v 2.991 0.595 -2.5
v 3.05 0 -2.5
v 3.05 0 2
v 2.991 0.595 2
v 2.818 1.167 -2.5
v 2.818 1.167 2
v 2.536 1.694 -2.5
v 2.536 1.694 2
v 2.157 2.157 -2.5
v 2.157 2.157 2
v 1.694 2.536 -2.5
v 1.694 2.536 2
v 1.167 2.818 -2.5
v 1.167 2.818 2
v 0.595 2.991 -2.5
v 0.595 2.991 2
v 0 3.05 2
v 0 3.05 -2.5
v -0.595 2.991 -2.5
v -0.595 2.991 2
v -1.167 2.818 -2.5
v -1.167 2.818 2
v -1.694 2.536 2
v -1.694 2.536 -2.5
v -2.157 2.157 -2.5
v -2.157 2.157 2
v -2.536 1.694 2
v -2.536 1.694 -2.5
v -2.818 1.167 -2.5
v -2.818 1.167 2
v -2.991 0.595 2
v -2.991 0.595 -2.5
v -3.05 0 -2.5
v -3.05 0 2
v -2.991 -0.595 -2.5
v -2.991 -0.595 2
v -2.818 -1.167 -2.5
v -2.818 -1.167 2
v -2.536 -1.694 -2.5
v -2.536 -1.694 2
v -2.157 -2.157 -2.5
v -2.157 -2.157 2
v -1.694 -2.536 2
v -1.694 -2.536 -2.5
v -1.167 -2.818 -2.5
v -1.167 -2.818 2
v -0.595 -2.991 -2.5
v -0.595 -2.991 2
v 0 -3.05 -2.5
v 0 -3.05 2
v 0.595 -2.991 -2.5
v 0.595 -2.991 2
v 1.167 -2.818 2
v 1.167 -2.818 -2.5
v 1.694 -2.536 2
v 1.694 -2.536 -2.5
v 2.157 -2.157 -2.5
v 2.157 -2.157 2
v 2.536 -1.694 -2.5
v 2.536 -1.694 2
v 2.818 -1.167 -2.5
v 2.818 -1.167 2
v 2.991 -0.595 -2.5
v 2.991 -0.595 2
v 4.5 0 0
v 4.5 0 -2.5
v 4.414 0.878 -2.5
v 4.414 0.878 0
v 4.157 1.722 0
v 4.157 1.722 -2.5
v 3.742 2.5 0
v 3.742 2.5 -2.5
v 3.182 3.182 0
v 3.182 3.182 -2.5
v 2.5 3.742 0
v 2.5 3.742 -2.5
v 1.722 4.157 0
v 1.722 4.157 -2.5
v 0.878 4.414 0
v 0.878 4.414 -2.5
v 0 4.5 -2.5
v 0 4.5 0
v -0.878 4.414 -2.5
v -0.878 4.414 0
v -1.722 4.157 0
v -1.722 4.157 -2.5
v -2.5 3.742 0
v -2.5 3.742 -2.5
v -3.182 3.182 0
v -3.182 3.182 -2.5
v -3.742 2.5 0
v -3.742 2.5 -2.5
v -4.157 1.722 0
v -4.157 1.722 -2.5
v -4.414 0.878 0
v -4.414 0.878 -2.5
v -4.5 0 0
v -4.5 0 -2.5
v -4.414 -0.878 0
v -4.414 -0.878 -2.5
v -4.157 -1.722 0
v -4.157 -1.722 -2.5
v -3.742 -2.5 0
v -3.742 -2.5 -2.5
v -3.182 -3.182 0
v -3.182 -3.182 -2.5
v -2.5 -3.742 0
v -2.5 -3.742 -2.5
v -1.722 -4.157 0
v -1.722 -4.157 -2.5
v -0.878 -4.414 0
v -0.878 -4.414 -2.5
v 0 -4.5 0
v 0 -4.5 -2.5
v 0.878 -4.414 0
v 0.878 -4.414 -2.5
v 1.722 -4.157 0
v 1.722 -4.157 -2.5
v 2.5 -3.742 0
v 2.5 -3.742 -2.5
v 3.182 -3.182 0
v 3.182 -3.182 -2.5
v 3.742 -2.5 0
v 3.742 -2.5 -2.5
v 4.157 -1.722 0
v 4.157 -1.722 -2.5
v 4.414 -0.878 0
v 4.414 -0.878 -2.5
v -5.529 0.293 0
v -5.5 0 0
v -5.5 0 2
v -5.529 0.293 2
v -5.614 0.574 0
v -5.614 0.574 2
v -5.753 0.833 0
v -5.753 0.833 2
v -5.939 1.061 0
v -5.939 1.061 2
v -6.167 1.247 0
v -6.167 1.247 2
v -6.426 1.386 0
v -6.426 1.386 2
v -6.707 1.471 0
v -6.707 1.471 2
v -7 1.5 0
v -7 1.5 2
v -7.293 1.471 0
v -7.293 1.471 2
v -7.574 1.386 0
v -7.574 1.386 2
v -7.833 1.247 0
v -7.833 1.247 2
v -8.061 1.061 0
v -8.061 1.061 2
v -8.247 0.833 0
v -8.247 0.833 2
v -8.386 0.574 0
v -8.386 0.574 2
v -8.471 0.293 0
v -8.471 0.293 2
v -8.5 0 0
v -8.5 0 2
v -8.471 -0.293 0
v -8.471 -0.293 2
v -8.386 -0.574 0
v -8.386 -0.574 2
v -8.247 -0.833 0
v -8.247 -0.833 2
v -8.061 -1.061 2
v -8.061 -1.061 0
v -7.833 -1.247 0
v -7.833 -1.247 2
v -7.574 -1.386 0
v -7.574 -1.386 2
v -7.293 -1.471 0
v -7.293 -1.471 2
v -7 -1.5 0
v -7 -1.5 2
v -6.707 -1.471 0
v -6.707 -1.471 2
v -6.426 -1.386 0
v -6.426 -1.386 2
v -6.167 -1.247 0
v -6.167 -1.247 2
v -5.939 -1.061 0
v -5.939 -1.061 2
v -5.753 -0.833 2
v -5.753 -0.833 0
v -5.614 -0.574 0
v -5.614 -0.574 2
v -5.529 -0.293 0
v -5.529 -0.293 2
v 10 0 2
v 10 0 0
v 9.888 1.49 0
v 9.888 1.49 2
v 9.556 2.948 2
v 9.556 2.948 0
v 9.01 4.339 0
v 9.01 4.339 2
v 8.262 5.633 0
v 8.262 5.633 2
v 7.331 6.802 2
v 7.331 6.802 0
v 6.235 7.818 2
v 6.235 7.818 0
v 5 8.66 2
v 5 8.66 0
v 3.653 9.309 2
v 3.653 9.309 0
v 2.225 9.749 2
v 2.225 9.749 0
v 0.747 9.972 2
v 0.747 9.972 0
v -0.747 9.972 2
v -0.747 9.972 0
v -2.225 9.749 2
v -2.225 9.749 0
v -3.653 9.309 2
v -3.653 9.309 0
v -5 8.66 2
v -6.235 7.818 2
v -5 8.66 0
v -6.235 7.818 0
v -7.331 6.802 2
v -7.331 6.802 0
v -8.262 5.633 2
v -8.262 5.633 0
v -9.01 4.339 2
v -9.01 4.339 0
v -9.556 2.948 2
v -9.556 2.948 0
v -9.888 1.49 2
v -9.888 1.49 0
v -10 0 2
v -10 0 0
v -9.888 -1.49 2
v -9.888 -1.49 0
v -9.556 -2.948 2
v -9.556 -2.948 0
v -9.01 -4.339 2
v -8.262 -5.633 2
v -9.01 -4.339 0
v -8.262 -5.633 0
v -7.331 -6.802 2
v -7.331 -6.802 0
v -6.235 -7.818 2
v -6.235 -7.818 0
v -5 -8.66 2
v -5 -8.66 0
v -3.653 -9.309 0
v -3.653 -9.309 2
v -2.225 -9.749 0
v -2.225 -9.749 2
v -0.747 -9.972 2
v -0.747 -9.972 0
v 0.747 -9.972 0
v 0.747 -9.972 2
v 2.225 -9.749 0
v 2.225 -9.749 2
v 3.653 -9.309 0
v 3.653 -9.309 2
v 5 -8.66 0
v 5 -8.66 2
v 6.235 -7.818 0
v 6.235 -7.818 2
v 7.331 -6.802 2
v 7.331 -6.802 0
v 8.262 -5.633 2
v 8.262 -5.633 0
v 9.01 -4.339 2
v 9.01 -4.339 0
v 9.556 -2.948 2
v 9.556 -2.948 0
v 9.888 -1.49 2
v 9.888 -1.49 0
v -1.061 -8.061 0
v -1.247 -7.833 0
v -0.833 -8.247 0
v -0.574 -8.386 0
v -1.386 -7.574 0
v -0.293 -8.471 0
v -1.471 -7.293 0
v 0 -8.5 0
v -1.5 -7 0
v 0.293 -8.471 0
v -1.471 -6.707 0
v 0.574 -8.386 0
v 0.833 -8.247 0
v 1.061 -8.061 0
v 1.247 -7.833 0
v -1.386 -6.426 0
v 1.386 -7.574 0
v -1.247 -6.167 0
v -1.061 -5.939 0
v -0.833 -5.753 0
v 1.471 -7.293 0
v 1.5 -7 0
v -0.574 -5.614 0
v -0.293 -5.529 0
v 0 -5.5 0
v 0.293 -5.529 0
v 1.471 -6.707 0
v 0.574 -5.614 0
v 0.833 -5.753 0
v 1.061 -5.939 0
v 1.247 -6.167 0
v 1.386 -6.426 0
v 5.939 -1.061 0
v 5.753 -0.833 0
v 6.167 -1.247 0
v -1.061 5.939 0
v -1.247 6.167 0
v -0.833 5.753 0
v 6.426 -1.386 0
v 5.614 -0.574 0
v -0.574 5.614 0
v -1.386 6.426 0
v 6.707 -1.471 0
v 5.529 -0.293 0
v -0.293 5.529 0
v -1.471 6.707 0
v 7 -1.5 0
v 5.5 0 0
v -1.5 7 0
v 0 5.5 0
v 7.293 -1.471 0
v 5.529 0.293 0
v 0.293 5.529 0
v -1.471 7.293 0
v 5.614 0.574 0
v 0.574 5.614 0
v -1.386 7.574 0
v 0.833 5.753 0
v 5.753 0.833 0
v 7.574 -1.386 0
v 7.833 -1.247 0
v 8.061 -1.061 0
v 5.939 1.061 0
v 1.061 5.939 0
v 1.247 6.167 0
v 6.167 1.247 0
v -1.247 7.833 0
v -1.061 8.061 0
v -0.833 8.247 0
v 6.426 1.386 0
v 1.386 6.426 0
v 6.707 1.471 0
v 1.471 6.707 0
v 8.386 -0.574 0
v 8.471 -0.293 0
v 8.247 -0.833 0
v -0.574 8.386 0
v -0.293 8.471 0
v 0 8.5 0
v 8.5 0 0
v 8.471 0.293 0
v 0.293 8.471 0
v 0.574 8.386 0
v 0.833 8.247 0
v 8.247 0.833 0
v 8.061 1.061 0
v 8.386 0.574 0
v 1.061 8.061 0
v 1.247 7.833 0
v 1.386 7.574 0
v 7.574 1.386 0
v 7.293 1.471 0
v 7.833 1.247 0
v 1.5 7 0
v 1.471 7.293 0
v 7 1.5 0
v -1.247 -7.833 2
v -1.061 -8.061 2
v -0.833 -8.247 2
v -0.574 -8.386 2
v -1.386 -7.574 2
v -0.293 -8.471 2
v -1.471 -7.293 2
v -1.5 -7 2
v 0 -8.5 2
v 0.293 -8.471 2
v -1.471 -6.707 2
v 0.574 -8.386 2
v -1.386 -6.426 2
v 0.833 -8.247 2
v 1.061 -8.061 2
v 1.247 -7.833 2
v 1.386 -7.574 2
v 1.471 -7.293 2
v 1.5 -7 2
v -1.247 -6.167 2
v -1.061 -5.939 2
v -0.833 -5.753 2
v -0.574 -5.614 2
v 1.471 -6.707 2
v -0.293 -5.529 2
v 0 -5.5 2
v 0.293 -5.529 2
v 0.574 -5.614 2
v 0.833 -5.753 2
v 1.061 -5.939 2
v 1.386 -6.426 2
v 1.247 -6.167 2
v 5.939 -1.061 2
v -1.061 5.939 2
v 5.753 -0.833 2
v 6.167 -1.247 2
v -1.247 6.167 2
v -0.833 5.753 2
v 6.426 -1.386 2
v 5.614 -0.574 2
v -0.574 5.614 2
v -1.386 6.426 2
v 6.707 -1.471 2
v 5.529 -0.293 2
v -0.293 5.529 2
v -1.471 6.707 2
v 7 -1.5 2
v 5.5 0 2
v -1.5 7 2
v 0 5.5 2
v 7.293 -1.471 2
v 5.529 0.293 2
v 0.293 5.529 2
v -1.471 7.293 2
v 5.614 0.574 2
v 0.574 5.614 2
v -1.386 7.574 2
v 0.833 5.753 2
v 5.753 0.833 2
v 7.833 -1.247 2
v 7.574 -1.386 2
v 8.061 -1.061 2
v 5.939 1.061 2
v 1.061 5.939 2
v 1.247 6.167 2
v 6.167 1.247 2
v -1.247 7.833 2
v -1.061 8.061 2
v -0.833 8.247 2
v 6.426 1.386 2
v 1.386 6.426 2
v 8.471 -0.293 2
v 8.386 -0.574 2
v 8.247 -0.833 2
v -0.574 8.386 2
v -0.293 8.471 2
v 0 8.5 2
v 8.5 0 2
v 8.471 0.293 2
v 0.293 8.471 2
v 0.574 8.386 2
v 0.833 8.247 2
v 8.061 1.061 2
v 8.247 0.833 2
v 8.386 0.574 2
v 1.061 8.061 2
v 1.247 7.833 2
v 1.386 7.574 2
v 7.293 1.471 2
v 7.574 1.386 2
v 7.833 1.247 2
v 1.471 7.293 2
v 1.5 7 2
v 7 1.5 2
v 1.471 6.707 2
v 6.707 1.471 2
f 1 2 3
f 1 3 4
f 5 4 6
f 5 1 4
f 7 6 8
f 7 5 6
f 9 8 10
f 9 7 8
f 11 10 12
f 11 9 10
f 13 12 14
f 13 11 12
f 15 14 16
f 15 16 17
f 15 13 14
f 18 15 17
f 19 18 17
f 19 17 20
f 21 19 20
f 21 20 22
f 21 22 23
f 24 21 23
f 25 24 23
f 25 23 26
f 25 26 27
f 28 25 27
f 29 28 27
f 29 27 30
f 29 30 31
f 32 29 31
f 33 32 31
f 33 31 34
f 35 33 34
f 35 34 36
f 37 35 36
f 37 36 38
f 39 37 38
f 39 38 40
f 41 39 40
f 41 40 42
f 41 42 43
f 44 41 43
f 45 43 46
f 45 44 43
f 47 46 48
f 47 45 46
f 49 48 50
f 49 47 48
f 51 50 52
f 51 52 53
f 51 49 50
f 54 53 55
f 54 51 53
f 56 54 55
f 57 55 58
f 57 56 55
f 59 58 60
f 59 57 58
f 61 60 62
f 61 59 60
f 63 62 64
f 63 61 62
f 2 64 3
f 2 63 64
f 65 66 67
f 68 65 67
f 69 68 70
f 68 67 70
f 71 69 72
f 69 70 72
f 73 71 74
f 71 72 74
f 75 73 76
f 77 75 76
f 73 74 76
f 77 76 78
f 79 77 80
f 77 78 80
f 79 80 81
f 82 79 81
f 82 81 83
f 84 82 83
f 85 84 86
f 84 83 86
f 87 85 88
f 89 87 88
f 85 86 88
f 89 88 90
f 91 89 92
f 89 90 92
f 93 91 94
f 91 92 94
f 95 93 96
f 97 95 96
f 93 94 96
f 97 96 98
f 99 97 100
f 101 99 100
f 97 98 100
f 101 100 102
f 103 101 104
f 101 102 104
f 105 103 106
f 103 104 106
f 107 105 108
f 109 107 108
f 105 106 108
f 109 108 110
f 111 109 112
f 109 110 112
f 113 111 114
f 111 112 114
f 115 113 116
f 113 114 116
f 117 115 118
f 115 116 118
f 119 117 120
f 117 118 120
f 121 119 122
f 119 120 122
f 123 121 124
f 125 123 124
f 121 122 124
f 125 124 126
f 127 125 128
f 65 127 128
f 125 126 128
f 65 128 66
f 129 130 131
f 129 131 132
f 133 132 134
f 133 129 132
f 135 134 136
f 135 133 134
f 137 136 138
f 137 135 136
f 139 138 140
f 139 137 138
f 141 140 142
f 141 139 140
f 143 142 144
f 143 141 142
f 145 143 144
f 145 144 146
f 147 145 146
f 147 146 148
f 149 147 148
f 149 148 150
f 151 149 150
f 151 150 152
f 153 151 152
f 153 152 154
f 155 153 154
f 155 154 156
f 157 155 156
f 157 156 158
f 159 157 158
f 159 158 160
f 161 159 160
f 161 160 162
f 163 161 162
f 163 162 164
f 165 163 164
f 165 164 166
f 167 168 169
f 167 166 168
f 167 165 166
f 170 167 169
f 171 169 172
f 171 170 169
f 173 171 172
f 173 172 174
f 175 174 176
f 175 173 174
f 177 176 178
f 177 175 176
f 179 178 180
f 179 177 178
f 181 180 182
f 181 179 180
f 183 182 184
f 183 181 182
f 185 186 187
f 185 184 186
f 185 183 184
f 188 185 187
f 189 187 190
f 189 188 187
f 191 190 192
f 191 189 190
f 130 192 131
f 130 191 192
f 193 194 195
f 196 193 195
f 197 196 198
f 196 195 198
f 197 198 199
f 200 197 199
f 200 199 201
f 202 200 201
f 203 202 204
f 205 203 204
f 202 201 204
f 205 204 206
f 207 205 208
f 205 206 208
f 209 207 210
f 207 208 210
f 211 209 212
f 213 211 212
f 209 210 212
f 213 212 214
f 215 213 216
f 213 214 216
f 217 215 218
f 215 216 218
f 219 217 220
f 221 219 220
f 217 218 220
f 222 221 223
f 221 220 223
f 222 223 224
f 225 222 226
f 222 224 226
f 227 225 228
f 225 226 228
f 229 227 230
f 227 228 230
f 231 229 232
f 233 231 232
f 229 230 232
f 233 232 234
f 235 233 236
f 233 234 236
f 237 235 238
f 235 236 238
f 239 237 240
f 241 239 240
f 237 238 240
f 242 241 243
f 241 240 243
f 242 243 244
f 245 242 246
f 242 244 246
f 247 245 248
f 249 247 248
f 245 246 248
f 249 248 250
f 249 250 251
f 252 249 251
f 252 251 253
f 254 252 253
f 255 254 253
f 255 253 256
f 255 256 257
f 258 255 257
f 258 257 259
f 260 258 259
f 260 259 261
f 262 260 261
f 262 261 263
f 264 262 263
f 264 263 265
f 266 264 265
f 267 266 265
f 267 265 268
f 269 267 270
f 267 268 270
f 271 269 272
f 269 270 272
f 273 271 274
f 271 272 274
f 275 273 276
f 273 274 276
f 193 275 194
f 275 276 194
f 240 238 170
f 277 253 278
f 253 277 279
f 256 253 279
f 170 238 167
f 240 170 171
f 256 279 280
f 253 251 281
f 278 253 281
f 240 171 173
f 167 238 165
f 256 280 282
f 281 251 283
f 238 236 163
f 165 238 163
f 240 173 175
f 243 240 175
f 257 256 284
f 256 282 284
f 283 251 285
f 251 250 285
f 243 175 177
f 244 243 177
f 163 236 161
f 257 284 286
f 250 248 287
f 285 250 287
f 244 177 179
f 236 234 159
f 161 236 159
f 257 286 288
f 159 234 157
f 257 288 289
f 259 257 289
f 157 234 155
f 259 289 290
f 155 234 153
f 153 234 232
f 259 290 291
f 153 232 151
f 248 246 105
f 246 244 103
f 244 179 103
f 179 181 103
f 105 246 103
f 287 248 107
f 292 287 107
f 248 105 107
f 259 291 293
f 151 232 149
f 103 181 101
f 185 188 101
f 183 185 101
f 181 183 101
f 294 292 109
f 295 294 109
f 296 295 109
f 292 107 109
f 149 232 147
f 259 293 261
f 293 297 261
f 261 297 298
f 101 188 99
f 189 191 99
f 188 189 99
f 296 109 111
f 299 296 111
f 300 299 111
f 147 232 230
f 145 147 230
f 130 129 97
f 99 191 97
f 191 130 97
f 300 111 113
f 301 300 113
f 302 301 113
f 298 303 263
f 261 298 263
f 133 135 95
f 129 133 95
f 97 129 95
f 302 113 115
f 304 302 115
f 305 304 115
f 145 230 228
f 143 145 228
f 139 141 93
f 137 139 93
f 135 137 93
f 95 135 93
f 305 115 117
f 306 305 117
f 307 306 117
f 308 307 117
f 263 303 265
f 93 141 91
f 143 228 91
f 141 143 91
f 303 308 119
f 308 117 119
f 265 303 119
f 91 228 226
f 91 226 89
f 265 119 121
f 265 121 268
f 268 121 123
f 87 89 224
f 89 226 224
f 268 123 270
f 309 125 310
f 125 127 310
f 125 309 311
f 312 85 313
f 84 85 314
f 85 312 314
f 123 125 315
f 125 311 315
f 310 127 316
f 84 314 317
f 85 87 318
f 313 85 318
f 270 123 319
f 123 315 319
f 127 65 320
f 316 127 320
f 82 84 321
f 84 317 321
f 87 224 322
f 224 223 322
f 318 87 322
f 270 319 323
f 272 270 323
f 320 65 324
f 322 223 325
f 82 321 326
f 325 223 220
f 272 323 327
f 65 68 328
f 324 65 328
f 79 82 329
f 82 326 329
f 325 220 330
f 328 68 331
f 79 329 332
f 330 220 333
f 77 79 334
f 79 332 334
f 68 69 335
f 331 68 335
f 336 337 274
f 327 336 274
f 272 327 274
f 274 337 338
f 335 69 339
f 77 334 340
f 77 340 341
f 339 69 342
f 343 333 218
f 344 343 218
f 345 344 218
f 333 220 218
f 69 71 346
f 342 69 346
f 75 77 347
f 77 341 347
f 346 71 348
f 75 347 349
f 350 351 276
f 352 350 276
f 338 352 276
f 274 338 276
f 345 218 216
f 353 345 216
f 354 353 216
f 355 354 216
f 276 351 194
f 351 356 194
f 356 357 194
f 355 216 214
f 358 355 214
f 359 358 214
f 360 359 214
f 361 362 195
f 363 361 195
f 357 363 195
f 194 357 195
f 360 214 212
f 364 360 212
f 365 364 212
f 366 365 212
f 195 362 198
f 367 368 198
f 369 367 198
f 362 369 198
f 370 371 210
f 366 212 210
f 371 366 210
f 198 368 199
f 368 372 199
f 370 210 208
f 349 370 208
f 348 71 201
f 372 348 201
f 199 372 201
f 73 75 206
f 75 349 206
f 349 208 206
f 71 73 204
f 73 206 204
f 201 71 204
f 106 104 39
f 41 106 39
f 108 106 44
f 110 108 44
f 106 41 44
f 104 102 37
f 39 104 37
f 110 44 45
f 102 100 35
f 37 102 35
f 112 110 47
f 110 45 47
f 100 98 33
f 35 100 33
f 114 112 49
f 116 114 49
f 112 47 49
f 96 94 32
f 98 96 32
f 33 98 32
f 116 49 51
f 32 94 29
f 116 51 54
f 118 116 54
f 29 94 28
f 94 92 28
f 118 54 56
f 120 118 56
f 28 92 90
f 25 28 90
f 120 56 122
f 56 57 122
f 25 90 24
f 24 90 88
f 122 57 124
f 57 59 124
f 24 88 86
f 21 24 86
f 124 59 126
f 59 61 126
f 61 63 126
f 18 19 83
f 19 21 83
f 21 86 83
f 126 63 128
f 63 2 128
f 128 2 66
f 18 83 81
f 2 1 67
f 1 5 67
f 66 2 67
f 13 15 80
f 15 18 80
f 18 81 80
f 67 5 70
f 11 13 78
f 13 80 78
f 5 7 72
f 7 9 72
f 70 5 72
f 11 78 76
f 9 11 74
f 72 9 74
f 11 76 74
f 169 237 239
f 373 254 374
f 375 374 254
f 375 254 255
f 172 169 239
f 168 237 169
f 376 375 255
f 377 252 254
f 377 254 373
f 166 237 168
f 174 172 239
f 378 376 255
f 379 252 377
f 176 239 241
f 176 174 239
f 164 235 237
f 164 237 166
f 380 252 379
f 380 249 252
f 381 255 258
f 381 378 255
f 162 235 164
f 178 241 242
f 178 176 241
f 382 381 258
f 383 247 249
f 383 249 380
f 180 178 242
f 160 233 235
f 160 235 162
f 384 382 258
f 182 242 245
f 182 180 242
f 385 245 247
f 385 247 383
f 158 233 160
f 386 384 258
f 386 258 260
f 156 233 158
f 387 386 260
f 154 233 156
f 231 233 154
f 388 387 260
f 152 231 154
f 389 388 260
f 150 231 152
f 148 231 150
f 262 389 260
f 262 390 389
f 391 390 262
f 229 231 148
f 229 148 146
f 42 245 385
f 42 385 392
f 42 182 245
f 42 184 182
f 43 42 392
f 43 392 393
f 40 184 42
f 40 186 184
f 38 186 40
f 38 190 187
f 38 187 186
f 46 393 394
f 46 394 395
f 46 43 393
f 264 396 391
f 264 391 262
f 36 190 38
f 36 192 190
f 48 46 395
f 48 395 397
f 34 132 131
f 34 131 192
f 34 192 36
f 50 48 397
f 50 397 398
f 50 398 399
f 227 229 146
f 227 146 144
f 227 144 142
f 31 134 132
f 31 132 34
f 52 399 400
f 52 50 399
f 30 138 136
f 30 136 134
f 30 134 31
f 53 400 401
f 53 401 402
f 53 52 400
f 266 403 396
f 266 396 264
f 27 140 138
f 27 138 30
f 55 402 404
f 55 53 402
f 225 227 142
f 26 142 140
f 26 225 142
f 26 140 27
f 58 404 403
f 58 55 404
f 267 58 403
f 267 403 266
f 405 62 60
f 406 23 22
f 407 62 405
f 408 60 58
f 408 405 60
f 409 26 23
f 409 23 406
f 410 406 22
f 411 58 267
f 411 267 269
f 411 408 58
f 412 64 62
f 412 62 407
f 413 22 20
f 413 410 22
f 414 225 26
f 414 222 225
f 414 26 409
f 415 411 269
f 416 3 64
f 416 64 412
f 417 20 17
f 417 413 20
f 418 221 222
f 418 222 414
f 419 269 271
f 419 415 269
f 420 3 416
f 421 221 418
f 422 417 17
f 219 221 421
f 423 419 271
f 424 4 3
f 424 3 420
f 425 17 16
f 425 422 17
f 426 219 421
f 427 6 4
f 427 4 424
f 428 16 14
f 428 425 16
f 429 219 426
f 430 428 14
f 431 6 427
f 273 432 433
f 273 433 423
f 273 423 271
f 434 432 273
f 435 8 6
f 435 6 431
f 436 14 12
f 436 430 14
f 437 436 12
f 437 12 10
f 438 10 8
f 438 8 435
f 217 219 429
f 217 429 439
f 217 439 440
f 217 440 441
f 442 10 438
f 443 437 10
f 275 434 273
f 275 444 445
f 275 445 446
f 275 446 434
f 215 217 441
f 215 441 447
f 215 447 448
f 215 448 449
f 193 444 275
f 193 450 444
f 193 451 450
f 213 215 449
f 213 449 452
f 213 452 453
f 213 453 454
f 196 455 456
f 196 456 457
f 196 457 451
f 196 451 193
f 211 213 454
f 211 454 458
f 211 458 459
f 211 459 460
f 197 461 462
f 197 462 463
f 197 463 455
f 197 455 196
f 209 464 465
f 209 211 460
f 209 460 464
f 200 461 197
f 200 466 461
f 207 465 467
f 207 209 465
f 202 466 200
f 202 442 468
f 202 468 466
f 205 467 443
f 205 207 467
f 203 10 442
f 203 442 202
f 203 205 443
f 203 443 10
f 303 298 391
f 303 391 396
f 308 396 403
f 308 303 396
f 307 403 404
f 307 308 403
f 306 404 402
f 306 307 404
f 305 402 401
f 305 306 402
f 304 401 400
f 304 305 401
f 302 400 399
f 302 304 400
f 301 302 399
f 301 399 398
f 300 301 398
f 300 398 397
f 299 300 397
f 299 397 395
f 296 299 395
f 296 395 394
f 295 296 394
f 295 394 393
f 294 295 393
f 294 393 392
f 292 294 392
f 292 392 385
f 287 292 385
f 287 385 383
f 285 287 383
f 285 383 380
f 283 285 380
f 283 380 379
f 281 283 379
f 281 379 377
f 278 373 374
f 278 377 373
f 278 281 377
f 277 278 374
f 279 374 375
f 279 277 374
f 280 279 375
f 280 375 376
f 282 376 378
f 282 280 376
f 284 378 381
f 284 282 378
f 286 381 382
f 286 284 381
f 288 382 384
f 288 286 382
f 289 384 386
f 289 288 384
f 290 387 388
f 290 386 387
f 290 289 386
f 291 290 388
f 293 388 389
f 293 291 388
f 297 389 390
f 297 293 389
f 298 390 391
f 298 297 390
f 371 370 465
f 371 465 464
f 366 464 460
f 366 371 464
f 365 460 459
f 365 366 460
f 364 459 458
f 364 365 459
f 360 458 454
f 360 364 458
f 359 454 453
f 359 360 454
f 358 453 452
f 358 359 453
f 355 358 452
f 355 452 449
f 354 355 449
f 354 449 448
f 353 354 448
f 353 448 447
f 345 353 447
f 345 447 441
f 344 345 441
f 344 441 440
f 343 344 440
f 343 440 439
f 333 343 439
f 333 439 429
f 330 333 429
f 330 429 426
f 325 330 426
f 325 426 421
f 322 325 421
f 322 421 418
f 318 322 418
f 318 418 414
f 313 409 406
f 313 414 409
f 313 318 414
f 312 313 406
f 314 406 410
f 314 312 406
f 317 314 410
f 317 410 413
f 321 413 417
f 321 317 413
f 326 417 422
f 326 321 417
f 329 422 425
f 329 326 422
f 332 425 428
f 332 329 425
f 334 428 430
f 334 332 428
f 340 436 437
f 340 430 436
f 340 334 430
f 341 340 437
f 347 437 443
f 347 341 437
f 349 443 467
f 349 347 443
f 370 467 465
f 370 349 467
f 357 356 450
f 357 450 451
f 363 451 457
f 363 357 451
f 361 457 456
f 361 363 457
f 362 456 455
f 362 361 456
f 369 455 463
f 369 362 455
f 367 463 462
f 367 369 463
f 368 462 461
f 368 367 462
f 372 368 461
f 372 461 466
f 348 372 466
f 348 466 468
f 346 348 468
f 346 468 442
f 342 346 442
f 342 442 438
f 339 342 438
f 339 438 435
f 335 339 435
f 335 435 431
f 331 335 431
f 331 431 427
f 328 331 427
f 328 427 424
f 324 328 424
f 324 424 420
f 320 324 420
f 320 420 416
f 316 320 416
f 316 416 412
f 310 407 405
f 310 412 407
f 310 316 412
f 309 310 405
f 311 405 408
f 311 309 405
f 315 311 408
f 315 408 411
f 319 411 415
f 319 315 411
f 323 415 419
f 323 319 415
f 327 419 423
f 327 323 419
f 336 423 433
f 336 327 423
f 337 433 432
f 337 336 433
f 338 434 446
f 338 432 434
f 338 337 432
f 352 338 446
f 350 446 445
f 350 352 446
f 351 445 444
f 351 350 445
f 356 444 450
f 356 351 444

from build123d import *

# Parameters (mm, degrees)
METAL_DISC_OD20_THICKNESS2_PROFILE_R       = 10
METAL_DISC_OD20_THICKNESS2_PROFILE_R_2     = 3.05
METAL_DISC_OD20_THICKNESS2_DEPTH           = 2
PURCHASED_25T_HUB_ENVELOPE_OD9_START       = -2.5
PURCHASED_25T_HUB_ENVELOPE_OD9_PROFILE_R   = 4.5
PURCHASED_25T_HUB_ENVELOPE_OD9_PROFILE_R_2 = 3.05
PURCHASED_25T_HUB_ENVELOPE_OD9_DEPTH       = 2.5
FOUR_M3_TAPPED_HOLE_ENVELOPES_PCD14_START  = -50
FOUR_M3_TAPPED_HOLE_ENVELOPES_PCD14_PROF_R = 1.5
FOUR_M3_TAPPED_HOLE_ENVELOPES_PCD14_DEPTH  = 65.361406616


with BuildPart() as part:
    # Metal_disc_OD20_thickness2_profile → Metal_disc_OD20_thickness2 (new body)
    with BuildSketch(Plane.XY):
        Circle(METAL_DISC_OD20_THICKNESS2_PROFILE_R)
        Circle(METAL_DISC_OD20_THICKNESS2_PROFILE_R_2, mode=Mode.SUBTRACT)
    extrude(amount=METAL_DISC_OD20_THICKNESS2_DEPTH)

    # Purchased_25T_hub_envelope_OD9_profile → Purchased_25T_hub_envelope_OD9 (add)
    with BuildSketch(Plane.XY.offset(PURCHASED_25T_HUB_ENVELOPE_OD9_START)):
        Circle(PURCHASED_25T_HUB_ENVELOPE_OD9_PROFILE_R)
        Circle(PURCHASED_25T_HUB_ENVELOPE_OD9_PROFILE_R_2, mode=Mode.SUBTRACT)
    extrude(amount=PURCHASED_25T_HUB_ENVELOPE_OD9_DEPTH)

    # Four_M3_tapped_hole_envelopes_PCD14_profile → Four_M3_tapped_hole_envelopes_PCD14 (cut, through all)
    with BuildSketch(Plane.XY.offset(FOUR_M3_TAPPED_HOLE_ENVELOPES_PCD14_START)):
        with Locations((-7, 0)):
            Circle(FOUR_M3_TAPPED_HOLE_ENVELOPES_PCD14_PROF_R)
        with Locations((7, 0)):
            Circle(FOUR_M3_TAPPED_HOLE_ENVELOPES_PCD14_PROF_R)
        with Locations((0, -7)):
            Circle(FOUR_M3_TAPPED_HOLE_ENVELOPES_PCD14_PROF_R)
        with Locations((0, 7)):
            Circle(FOUR_M3_TAPPED_HOLE_ENVELOPES_PCD14_PROF_R)
    extrude(amount=FOUR_M3_TAPPED_HOLE_ENVELOPES_PCD14_DEPTH, mode=Mode.SUBTRACT)


solid = part.part
